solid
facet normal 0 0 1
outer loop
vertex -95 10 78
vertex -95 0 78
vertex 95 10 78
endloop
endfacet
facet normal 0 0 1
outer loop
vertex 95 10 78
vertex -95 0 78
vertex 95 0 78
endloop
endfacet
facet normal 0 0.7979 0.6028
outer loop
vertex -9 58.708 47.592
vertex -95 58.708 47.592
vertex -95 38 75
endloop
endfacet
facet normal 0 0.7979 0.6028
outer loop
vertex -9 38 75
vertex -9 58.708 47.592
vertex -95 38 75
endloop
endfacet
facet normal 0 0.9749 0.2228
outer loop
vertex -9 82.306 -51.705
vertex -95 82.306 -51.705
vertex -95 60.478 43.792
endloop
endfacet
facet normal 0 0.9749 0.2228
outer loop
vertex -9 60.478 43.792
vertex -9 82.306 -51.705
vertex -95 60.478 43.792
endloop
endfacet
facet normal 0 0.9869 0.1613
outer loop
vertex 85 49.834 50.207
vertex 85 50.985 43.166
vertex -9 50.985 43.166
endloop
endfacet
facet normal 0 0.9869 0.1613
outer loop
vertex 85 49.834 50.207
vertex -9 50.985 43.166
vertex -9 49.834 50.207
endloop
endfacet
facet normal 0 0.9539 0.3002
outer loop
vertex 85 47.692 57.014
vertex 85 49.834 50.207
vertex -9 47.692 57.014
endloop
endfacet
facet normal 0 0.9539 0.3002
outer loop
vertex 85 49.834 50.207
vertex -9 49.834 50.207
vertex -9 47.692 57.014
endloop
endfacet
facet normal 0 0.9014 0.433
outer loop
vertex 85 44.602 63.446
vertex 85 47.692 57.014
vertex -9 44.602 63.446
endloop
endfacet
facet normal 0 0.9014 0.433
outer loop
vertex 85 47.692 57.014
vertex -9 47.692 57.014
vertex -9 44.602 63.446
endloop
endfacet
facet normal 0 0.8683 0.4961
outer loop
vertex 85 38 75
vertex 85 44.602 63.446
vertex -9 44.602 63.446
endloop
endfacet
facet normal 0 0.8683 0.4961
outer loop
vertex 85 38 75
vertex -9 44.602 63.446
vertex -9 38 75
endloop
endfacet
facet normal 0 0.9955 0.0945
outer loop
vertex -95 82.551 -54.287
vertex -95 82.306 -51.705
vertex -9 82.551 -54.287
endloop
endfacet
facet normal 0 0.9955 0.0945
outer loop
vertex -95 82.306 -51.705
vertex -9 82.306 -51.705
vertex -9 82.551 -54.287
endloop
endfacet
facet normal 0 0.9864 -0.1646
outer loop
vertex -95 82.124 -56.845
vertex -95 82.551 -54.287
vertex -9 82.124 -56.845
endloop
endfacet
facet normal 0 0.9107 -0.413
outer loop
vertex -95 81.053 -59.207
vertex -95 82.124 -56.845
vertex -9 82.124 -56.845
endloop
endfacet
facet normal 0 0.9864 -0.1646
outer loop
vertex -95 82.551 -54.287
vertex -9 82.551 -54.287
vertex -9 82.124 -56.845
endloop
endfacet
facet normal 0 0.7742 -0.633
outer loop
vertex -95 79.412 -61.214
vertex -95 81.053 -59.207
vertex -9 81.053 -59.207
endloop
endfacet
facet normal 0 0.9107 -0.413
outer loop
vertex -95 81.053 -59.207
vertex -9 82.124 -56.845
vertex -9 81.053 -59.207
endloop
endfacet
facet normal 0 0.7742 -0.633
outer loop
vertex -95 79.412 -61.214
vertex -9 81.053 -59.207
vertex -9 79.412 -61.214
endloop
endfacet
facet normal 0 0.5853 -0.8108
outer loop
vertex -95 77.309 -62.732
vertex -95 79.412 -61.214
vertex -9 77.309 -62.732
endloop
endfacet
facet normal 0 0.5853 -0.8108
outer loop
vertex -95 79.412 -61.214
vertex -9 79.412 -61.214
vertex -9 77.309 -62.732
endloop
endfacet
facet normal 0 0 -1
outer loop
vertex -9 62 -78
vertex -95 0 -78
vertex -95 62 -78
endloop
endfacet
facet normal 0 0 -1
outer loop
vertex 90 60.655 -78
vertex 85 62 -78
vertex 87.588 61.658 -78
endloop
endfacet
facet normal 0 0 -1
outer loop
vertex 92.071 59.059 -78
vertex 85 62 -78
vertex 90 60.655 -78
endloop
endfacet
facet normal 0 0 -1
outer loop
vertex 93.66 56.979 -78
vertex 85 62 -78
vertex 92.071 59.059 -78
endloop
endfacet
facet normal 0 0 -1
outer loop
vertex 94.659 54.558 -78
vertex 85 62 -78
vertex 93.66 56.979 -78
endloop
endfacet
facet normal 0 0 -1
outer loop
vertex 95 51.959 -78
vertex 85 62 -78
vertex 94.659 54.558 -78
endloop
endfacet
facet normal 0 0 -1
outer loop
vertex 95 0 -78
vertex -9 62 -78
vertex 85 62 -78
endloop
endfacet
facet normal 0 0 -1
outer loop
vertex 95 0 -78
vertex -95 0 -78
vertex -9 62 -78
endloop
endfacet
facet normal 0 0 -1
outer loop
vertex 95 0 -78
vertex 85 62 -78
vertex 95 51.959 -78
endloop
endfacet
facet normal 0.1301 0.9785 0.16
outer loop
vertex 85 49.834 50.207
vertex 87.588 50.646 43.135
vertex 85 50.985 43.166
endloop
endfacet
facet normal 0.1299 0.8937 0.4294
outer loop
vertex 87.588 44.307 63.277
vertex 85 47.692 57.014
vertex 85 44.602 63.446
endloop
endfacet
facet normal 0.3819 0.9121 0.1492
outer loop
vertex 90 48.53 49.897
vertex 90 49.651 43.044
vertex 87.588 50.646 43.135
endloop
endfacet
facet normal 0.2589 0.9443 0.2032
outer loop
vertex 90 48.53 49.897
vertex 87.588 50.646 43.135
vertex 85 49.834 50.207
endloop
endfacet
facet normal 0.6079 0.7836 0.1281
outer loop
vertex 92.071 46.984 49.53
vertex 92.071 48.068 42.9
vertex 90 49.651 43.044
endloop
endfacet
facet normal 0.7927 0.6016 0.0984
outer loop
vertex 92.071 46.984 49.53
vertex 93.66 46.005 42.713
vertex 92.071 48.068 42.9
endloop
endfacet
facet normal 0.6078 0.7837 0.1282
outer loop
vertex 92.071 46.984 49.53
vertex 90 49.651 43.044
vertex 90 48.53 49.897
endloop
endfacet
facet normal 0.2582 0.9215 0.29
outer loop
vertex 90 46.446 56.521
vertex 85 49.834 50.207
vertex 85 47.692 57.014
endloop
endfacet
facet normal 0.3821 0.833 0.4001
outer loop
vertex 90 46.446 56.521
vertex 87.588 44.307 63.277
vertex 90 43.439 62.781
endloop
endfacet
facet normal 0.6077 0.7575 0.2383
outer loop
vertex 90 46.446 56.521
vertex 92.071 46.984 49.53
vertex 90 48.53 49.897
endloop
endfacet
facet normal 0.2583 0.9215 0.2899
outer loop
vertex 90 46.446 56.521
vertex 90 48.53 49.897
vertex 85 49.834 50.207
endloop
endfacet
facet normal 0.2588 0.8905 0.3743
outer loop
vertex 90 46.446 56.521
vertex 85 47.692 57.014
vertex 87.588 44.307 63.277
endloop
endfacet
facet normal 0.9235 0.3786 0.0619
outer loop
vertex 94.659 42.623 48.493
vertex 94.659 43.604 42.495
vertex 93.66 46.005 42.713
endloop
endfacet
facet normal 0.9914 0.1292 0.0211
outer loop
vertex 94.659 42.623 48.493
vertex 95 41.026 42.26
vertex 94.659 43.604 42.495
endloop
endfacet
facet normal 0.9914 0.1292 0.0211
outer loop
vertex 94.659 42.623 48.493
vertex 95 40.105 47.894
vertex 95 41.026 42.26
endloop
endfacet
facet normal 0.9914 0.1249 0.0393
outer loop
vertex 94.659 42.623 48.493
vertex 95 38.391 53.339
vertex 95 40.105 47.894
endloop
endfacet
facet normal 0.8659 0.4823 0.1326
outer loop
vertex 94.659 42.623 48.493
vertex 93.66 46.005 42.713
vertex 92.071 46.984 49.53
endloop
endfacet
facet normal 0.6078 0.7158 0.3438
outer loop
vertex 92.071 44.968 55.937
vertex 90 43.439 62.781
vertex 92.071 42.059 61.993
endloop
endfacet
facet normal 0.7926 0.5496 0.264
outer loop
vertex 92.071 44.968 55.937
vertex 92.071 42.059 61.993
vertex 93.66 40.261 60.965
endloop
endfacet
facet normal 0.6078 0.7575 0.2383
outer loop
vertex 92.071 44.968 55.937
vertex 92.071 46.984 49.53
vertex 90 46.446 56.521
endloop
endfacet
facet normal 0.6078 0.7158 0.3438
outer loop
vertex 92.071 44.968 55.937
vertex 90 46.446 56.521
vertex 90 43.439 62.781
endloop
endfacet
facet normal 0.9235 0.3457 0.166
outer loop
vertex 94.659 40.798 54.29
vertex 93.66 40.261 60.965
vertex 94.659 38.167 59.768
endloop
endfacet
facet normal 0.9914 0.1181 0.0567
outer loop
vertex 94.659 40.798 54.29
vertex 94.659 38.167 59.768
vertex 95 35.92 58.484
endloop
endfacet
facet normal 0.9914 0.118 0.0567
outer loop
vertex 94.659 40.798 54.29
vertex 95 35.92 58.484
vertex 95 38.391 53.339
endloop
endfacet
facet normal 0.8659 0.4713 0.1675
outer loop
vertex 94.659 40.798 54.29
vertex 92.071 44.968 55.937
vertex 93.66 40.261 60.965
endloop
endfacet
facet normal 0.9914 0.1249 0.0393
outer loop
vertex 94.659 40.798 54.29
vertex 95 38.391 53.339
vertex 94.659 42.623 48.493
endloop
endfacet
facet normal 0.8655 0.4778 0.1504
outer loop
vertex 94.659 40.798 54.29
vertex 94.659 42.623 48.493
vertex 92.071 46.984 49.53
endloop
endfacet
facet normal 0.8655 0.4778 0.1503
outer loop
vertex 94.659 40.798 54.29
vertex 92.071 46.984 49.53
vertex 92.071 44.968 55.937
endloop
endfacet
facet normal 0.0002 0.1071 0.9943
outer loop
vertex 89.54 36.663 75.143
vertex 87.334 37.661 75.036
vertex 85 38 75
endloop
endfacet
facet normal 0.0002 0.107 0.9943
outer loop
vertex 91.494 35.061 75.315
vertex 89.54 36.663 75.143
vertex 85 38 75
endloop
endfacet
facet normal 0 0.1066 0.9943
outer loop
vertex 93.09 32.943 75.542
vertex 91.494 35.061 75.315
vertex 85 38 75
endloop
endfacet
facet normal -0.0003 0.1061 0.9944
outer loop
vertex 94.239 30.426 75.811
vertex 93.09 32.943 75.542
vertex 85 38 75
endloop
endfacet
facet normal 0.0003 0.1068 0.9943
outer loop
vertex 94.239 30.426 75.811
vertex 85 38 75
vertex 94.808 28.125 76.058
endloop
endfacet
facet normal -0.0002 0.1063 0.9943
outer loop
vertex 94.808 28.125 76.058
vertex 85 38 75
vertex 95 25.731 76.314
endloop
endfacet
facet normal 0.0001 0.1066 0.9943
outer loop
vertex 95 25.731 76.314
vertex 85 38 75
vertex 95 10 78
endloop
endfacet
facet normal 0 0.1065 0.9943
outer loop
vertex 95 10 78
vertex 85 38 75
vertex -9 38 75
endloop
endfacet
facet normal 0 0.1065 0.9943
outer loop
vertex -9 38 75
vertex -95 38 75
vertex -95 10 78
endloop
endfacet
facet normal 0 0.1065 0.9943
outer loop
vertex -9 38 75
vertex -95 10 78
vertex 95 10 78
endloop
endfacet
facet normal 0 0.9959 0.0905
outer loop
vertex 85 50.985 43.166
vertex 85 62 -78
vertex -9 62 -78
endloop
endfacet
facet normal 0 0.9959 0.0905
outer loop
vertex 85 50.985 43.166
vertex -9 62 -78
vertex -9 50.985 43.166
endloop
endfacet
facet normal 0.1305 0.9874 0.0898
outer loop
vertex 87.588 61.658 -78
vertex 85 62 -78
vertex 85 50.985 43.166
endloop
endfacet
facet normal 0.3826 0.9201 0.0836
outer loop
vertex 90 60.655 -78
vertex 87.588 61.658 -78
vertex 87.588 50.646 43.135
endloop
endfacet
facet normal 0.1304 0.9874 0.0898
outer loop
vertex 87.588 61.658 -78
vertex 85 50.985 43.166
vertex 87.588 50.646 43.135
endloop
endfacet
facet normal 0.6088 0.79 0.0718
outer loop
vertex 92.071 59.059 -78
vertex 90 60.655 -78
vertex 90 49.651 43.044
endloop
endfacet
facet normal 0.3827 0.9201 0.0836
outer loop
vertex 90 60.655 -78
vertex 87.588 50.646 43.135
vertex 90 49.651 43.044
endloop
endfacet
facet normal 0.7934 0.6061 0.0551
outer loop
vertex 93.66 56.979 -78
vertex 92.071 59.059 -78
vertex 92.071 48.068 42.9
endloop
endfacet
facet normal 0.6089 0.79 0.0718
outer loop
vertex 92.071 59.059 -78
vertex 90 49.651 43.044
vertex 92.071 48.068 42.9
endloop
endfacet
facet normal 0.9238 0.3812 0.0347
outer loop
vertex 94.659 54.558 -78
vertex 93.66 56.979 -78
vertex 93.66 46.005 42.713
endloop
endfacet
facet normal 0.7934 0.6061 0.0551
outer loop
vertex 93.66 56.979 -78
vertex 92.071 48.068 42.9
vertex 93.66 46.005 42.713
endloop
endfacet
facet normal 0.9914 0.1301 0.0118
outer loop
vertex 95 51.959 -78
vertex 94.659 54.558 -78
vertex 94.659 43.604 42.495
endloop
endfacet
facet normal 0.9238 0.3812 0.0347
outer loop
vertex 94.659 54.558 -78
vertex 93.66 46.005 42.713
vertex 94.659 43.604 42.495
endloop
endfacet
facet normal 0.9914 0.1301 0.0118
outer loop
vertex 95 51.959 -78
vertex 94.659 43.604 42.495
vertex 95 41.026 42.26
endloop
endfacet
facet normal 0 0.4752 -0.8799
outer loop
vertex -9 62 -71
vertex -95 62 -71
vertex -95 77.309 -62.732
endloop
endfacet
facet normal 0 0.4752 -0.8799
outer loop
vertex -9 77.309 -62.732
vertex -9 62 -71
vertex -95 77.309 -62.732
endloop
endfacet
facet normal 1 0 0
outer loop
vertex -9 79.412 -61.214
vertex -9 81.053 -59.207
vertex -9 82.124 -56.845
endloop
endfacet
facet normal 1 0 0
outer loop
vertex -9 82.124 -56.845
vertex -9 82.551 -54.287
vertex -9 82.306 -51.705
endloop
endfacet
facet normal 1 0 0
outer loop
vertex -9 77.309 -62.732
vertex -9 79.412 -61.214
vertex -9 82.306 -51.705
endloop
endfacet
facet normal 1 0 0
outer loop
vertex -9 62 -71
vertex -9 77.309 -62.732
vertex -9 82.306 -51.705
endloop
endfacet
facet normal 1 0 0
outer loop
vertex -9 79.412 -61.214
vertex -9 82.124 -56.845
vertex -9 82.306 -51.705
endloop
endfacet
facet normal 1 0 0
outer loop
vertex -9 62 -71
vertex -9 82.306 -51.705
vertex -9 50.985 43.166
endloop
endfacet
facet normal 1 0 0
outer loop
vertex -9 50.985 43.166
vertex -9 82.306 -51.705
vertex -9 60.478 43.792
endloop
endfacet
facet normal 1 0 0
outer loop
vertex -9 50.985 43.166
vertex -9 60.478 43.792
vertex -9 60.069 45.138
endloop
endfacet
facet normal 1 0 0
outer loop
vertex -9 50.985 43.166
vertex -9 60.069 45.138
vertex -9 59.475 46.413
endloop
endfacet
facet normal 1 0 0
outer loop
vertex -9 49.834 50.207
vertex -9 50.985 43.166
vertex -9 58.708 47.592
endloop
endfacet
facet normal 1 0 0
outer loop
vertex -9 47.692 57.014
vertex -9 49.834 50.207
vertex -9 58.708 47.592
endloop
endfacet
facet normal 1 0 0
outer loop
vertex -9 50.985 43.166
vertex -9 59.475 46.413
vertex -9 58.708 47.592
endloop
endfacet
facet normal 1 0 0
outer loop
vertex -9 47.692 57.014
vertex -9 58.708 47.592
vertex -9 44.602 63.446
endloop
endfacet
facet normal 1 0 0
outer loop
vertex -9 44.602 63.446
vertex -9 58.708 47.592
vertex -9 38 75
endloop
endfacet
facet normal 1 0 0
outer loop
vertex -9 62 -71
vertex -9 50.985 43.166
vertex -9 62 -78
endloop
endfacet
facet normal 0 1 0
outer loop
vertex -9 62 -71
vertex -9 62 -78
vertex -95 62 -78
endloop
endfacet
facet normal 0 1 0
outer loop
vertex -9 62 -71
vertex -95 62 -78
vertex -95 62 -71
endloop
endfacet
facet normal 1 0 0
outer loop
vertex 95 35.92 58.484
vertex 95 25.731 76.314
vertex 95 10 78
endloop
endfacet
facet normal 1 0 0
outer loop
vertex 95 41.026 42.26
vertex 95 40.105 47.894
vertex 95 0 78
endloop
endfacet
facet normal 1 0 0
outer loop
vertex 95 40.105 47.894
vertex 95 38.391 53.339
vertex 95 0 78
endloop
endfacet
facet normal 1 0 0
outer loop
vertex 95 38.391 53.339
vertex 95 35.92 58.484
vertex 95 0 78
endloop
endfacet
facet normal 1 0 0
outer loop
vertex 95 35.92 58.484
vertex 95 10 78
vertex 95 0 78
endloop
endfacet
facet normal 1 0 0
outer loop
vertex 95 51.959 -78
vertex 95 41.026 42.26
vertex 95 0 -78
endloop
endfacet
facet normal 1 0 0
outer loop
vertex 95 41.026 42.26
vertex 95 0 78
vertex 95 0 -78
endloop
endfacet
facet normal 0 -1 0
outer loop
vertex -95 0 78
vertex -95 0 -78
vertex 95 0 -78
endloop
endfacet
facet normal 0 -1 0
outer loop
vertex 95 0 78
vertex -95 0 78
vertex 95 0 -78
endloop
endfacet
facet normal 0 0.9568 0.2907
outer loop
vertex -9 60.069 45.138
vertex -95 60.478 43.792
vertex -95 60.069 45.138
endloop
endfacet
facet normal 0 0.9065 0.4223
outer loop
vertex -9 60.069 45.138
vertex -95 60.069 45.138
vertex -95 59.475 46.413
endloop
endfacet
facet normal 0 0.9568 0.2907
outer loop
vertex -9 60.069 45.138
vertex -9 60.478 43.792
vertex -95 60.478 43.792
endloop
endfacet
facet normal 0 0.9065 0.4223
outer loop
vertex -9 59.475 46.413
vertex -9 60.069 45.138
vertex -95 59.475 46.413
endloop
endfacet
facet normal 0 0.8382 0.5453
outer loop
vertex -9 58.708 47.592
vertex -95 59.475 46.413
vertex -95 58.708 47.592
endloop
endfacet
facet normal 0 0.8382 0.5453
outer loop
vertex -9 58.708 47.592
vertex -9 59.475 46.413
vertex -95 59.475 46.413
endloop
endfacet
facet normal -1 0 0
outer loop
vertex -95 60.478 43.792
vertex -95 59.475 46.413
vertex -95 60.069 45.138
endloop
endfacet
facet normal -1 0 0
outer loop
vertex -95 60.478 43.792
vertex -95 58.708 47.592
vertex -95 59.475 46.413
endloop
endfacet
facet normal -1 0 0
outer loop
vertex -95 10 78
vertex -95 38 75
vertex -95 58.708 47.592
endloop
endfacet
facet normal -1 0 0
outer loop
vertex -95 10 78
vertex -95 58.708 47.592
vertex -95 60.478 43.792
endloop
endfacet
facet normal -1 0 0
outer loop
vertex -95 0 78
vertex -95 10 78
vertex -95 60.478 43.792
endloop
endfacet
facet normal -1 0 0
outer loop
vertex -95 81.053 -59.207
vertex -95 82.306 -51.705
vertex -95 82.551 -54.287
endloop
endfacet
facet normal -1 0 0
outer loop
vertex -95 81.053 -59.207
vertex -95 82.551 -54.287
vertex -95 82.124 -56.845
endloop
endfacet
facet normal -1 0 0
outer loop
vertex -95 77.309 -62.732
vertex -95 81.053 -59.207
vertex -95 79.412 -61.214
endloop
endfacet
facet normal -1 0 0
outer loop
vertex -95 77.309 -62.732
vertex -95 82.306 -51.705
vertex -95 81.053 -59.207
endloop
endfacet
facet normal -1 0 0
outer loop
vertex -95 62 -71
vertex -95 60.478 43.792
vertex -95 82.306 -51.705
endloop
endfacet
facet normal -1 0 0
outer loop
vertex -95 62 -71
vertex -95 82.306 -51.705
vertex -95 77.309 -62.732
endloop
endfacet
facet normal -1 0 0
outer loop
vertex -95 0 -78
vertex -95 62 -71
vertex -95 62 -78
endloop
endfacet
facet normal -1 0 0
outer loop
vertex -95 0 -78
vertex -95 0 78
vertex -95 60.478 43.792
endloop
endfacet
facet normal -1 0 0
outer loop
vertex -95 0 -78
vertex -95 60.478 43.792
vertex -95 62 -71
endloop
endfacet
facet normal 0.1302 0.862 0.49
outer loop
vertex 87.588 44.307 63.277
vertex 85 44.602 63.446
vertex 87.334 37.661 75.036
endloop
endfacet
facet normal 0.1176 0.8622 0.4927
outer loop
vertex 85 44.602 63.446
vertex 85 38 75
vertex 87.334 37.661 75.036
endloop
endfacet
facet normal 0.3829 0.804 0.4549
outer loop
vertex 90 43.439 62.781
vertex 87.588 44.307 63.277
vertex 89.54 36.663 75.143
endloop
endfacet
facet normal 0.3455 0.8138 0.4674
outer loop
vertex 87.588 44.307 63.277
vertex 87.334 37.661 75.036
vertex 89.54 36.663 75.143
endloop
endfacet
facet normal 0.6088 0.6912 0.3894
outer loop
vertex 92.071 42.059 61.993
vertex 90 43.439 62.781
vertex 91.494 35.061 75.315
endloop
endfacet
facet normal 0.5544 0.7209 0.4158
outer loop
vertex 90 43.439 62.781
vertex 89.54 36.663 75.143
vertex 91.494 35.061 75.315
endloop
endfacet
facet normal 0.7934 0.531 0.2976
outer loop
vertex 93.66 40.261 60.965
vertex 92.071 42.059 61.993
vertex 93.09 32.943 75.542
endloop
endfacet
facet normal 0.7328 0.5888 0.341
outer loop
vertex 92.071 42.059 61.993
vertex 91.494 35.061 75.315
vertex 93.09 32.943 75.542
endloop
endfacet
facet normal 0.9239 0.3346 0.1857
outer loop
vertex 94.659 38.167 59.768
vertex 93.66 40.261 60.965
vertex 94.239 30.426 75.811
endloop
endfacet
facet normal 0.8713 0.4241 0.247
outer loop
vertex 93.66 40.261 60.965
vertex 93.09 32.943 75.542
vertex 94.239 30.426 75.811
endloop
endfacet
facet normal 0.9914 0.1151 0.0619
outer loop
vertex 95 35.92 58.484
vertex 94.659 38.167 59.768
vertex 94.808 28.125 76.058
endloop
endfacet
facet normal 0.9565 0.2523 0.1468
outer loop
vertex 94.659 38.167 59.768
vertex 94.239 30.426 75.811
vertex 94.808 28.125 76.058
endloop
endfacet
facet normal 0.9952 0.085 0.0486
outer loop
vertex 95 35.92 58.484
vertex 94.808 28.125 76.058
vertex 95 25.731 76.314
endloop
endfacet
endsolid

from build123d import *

# Parameters (mm, degrees)
SKETCH1_W           = 190
SKETCH1_H           = 156
BOSS_EXTRUDE1_DEPTH = 84
CUT_EXTRUDE1_DEPTH  = 222.900878772
CUT_EXTRUDE2_DEPTH  = 104
FILLET1_R           = 50
FILLET2_R           = 10
FILLET3_R           = 10


with BuildPart() as part:
    # Sketch1 → Boss-Extrude1 (new body)
    with BuildSketch(Plane(origin=(0, 0, 0), x_dir=(1, 0, 0), z_dir=(0, 1, 0))):
        Rectangle(SKETCH1_W, SKETCH1_H)
    extrude(amount=BOSS_EXTRUDE1_DEPTH)

    # Sketch2 → Cut-Extrude1 (cut, through all)
    with BuildSketch(Plane.ZY.offset(95)):
        Polygon((-78, 84), (-78, 62), (-71, 62), (-59.118583078, 84), align=None)
        Polygon((78, 84), (-59.118583078, 84), (45.881416922, 60), (75, 38), (78, 10), align=None)
    extrude(amount=-CUT_EXTRUDE1_DEPTH, mode=Mode.SUBTRACT)

    # Sketch3 → Cut-Extrude2 (cut)
    with BuildSketch(Plane(origin=(95, 0, 0), x_dir=(0, 0, -1), z_dir=(1, 0, 0))):
        Polygon((-54, 50), (-75, 38), (-45.881416922, 60), (59.118583078, 84), (71, 62), (78, 62), align=None)
    extrude(amount=-CUT_EXTRUDE2_DEPTH, mode=Mode.SUBTRACT)

    # Fillet1
    fillet1_edges = [part.edges().sort_by_distance(p)[0] for p in [
        (43, 50, 54),
    ]]
    fillet(fillet1_edges, radius=FILLET1_R)

    # Fillet2
    fillet2_edges = [part.edges().sort_by_distance(p)[0] for p in [
        (-52, 84, -59.118583078),
    ]]
    fillet(fillet2_edges, radius=FILLET2_R)

    # Fillet3
    fillet3_edges = [part.edges().sort_by_distance(p)[0] for p in [
        (-52, 60, 45.881416922),
        (95, 56.49247454, -17.417219937),
        (95, 41.301222931, 69.22285987),
        (95, 48.884092571, 53.64880539),
    ]]
    fillet(fillet3_edges, radius=FILLET3_R)


solid = part.part
